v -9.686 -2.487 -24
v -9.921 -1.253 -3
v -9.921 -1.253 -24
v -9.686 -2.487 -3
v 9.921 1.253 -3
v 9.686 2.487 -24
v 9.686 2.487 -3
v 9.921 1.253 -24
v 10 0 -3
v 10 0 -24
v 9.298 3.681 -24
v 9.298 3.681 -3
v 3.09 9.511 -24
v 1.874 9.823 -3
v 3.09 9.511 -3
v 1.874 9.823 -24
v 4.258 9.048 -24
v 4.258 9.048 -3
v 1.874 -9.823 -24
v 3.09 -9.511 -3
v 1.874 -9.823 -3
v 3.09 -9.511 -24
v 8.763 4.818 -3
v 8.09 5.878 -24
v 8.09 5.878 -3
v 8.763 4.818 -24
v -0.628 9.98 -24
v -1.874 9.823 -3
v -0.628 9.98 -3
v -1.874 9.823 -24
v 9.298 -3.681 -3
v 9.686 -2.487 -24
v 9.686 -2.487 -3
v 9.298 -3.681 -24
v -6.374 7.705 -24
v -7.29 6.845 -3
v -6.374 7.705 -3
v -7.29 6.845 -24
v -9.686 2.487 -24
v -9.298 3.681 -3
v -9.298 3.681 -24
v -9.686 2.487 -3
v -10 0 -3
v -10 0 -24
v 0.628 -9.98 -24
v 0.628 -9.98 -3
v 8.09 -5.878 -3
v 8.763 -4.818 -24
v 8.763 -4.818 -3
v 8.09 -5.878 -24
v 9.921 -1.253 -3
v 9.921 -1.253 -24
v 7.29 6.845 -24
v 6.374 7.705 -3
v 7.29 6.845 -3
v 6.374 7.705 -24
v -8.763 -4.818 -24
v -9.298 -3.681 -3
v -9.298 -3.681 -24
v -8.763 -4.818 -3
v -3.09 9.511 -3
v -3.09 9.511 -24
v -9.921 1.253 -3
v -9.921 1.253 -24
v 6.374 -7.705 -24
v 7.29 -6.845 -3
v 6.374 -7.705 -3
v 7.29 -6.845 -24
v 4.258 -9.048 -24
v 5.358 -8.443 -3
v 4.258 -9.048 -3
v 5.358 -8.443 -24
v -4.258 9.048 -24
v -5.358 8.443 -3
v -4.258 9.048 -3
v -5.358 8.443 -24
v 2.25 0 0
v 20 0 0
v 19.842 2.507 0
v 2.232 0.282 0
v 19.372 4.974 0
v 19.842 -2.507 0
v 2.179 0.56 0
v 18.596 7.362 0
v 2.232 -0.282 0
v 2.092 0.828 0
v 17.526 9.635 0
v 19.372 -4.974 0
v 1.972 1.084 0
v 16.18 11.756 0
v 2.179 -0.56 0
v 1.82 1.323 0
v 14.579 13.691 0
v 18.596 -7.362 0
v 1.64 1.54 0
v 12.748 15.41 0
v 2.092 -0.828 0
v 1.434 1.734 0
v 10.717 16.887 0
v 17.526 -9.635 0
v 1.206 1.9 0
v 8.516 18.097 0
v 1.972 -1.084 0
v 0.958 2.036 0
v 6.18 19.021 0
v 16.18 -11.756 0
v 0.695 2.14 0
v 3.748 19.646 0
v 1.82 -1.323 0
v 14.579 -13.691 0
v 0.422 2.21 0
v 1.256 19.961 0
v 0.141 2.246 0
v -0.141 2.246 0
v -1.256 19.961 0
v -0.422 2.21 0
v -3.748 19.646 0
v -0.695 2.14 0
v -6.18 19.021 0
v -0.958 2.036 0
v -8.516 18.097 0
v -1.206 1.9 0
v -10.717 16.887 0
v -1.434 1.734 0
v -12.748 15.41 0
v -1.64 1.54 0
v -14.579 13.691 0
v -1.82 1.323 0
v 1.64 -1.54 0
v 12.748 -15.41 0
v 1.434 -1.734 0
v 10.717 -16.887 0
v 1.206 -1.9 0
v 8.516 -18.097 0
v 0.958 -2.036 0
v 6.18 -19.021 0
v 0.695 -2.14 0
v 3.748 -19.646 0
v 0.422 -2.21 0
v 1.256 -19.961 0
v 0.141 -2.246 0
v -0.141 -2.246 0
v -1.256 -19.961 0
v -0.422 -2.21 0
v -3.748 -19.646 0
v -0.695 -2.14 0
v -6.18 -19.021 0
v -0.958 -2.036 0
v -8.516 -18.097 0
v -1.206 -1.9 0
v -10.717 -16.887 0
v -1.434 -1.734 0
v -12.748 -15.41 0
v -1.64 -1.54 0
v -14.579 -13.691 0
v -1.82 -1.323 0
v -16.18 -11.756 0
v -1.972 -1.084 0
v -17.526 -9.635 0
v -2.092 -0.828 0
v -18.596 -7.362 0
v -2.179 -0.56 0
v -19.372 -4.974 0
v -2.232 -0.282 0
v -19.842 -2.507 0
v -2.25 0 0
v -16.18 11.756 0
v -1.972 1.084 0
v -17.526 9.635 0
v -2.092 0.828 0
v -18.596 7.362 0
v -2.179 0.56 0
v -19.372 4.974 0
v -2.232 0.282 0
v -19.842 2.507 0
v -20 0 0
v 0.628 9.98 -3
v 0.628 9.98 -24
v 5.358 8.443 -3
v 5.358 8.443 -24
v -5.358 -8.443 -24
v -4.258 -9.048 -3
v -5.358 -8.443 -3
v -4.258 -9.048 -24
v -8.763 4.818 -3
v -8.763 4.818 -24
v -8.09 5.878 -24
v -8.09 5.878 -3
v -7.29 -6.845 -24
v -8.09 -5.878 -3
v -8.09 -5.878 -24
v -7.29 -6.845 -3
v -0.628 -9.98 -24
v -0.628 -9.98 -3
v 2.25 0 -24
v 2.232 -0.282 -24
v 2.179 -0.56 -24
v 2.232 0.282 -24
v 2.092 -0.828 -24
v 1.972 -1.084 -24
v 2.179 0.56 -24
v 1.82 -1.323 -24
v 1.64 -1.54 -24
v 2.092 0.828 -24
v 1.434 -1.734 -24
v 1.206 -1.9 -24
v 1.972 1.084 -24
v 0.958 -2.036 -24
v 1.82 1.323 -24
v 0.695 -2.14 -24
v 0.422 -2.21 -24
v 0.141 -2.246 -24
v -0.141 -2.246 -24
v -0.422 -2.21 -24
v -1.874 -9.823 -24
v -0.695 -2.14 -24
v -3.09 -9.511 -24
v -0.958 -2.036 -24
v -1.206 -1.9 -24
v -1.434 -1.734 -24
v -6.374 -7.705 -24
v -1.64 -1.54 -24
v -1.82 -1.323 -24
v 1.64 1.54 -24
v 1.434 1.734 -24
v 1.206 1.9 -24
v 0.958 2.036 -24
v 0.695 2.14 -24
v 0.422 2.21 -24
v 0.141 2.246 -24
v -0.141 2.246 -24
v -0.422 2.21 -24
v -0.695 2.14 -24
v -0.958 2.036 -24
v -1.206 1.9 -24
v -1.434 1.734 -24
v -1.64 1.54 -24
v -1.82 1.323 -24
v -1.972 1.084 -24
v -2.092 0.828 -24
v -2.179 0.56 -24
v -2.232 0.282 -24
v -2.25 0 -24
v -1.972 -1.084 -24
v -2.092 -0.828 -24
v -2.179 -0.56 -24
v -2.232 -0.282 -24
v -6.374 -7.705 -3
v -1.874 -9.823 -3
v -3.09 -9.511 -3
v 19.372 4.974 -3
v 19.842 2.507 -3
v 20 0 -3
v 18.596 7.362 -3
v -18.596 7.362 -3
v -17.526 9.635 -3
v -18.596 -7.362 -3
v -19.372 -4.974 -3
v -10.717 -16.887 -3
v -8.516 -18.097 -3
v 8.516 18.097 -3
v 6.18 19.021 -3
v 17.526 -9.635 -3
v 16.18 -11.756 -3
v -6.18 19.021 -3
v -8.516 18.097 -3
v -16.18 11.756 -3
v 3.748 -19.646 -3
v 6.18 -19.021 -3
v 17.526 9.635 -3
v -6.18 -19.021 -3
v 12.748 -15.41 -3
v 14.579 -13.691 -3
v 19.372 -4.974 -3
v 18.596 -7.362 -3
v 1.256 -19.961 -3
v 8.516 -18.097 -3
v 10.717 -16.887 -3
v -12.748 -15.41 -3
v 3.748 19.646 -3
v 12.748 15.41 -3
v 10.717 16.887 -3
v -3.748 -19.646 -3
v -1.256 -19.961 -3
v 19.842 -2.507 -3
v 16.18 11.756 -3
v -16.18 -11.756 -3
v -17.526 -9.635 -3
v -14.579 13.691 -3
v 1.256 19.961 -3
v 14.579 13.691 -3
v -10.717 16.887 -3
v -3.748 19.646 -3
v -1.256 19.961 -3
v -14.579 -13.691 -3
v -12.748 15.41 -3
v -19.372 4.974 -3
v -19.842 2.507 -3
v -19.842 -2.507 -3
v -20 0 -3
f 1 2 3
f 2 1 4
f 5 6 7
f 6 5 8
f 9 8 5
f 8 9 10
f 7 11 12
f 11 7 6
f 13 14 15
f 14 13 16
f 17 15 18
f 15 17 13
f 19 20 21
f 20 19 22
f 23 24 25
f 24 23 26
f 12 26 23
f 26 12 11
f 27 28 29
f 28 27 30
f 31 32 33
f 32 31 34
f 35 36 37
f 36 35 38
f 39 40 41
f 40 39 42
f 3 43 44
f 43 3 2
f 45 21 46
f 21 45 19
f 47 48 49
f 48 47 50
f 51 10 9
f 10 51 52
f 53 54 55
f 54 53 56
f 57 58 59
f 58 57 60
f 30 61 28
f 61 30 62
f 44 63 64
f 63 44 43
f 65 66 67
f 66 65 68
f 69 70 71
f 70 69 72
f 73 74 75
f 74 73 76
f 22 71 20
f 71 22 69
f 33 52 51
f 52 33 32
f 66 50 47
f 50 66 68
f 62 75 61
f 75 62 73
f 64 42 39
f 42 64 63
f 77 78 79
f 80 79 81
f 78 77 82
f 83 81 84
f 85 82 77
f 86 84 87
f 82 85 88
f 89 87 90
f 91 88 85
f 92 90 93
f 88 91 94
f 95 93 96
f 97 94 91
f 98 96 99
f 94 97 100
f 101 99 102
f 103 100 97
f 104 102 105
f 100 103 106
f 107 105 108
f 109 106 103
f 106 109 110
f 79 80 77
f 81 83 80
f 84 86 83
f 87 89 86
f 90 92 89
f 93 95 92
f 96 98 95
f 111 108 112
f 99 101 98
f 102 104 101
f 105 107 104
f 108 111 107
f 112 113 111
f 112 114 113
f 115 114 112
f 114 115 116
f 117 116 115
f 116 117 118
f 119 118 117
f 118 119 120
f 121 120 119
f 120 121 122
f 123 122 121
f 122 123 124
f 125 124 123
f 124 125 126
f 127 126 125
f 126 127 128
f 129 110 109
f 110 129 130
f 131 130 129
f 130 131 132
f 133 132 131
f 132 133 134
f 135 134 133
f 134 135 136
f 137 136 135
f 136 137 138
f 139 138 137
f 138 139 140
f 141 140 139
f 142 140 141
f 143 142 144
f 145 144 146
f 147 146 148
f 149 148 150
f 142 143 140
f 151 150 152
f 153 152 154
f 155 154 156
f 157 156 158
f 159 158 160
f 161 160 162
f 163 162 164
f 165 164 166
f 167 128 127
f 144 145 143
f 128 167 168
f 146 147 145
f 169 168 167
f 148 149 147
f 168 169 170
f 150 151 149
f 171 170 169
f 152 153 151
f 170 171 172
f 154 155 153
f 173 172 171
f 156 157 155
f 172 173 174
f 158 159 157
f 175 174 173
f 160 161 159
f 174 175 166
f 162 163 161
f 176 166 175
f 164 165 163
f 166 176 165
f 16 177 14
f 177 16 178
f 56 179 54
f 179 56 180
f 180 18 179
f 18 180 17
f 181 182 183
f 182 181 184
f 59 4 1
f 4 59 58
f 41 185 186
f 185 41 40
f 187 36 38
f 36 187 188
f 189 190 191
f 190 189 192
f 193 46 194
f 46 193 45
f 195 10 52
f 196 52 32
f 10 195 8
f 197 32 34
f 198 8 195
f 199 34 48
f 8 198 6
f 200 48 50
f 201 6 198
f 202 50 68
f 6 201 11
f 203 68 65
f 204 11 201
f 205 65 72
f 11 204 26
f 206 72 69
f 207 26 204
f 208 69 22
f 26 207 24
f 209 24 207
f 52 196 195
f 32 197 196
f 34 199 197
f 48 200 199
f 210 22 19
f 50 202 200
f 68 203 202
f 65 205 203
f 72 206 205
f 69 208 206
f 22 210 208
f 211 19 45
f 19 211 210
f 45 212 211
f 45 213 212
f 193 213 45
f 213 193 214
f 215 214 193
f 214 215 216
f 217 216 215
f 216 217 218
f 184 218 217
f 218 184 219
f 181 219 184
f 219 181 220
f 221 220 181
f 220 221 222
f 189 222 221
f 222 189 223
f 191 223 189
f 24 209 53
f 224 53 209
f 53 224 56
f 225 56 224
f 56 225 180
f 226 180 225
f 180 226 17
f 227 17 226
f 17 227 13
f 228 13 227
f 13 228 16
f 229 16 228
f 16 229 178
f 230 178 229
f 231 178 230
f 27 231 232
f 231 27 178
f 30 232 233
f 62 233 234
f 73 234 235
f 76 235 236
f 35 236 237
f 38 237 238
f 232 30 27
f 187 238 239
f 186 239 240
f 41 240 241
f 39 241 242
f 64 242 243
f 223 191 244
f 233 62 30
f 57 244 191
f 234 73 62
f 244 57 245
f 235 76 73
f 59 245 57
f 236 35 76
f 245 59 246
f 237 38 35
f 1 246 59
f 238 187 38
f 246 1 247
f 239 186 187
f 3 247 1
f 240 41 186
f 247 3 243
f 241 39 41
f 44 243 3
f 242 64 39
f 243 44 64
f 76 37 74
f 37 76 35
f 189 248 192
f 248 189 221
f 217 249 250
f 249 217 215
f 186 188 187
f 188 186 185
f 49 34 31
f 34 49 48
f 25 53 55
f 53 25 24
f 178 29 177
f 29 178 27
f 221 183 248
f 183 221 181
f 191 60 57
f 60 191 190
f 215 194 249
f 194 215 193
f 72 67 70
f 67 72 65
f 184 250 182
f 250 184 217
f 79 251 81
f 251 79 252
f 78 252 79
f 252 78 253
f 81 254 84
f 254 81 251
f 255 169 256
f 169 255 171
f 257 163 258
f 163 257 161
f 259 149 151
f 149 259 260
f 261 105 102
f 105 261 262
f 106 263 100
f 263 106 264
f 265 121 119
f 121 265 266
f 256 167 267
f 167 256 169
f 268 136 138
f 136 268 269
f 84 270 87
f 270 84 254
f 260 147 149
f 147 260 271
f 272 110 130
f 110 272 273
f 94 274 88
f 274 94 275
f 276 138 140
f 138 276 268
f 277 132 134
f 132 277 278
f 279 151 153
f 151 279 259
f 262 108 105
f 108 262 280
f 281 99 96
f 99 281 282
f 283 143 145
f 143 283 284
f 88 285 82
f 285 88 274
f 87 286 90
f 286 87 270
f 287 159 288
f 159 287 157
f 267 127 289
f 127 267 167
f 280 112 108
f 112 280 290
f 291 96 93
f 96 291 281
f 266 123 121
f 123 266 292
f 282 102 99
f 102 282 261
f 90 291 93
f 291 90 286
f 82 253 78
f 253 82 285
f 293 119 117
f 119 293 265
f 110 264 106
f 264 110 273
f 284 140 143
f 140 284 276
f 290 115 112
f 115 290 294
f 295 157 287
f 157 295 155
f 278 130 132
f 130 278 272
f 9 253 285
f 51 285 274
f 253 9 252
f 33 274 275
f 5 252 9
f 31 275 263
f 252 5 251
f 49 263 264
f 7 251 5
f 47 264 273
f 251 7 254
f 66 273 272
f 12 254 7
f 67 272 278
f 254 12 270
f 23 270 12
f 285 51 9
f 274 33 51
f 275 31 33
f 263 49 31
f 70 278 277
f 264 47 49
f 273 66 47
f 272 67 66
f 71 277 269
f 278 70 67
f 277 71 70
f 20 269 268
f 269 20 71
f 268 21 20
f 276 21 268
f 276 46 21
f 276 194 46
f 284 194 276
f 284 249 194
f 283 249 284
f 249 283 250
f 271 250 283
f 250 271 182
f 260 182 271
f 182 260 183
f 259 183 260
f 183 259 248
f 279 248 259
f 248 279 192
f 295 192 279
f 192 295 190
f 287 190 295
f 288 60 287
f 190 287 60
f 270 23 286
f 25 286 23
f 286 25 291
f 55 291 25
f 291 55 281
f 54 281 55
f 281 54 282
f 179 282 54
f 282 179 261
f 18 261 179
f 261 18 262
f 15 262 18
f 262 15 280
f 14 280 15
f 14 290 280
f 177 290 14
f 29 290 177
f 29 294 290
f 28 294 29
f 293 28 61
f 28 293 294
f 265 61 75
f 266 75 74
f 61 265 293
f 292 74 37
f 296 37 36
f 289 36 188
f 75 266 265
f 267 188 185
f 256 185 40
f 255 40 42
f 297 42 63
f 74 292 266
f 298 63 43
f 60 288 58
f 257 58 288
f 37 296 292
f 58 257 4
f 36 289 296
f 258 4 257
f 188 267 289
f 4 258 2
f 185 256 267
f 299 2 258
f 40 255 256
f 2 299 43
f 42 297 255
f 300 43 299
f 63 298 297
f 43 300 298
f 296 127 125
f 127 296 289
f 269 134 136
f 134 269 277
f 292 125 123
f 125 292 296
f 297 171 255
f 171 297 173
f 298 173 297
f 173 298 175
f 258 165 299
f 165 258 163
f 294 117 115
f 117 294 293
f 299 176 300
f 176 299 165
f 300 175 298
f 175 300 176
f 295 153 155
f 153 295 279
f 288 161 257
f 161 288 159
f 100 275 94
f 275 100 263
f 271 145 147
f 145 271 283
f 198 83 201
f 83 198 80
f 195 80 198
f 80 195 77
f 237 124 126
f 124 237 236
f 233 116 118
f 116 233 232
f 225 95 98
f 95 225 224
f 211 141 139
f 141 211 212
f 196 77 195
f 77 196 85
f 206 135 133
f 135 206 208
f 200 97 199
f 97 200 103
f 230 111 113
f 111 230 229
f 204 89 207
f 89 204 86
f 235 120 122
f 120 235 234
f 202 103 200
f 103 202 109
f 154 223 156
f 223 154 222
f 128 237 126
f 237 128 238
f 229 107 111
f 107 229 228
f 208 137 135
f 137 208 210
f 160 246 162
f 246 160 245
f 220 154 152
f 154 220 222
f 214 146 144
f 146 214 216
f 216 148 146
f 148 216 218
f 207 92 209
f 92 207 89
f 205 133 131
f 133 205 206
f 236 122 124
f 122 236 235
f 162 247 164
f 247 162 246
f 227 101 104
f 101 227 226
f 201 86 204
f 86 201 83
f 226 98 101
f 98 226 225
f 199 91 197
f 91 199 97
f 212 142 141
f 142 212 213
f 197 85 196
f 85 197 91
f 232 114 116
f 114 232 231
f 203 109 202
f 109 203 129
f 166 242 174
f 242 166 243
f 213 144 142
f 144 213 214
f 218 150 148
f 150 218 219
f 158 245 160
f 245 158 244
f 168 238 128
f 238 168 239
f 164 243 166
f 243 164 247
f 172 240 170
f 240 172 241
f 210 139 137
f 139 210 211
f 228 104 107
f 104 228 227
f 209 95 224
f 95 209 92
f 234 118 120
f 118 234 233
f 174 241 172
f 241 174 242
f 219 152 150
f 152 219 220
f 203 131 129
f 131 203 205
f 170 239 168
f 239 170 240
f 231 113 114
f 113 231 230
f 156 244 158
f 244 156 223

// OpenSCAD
$fn = 50;


difference() {
	union() {
		translate(v = [0, 0, -24.0000000000]) {
			cylinder(h = 24, r = 10.0000000000);
		}
		translate(v = [0, 0, -3.0000000000]) {
			cylinder(h = 3, r = 20.0000000000);
		}
	}
	union() {
		#translate(v = [0, 0, -24]) {
			cylinder(h = 24, r = 2.2500000000);
		}
	}
}
